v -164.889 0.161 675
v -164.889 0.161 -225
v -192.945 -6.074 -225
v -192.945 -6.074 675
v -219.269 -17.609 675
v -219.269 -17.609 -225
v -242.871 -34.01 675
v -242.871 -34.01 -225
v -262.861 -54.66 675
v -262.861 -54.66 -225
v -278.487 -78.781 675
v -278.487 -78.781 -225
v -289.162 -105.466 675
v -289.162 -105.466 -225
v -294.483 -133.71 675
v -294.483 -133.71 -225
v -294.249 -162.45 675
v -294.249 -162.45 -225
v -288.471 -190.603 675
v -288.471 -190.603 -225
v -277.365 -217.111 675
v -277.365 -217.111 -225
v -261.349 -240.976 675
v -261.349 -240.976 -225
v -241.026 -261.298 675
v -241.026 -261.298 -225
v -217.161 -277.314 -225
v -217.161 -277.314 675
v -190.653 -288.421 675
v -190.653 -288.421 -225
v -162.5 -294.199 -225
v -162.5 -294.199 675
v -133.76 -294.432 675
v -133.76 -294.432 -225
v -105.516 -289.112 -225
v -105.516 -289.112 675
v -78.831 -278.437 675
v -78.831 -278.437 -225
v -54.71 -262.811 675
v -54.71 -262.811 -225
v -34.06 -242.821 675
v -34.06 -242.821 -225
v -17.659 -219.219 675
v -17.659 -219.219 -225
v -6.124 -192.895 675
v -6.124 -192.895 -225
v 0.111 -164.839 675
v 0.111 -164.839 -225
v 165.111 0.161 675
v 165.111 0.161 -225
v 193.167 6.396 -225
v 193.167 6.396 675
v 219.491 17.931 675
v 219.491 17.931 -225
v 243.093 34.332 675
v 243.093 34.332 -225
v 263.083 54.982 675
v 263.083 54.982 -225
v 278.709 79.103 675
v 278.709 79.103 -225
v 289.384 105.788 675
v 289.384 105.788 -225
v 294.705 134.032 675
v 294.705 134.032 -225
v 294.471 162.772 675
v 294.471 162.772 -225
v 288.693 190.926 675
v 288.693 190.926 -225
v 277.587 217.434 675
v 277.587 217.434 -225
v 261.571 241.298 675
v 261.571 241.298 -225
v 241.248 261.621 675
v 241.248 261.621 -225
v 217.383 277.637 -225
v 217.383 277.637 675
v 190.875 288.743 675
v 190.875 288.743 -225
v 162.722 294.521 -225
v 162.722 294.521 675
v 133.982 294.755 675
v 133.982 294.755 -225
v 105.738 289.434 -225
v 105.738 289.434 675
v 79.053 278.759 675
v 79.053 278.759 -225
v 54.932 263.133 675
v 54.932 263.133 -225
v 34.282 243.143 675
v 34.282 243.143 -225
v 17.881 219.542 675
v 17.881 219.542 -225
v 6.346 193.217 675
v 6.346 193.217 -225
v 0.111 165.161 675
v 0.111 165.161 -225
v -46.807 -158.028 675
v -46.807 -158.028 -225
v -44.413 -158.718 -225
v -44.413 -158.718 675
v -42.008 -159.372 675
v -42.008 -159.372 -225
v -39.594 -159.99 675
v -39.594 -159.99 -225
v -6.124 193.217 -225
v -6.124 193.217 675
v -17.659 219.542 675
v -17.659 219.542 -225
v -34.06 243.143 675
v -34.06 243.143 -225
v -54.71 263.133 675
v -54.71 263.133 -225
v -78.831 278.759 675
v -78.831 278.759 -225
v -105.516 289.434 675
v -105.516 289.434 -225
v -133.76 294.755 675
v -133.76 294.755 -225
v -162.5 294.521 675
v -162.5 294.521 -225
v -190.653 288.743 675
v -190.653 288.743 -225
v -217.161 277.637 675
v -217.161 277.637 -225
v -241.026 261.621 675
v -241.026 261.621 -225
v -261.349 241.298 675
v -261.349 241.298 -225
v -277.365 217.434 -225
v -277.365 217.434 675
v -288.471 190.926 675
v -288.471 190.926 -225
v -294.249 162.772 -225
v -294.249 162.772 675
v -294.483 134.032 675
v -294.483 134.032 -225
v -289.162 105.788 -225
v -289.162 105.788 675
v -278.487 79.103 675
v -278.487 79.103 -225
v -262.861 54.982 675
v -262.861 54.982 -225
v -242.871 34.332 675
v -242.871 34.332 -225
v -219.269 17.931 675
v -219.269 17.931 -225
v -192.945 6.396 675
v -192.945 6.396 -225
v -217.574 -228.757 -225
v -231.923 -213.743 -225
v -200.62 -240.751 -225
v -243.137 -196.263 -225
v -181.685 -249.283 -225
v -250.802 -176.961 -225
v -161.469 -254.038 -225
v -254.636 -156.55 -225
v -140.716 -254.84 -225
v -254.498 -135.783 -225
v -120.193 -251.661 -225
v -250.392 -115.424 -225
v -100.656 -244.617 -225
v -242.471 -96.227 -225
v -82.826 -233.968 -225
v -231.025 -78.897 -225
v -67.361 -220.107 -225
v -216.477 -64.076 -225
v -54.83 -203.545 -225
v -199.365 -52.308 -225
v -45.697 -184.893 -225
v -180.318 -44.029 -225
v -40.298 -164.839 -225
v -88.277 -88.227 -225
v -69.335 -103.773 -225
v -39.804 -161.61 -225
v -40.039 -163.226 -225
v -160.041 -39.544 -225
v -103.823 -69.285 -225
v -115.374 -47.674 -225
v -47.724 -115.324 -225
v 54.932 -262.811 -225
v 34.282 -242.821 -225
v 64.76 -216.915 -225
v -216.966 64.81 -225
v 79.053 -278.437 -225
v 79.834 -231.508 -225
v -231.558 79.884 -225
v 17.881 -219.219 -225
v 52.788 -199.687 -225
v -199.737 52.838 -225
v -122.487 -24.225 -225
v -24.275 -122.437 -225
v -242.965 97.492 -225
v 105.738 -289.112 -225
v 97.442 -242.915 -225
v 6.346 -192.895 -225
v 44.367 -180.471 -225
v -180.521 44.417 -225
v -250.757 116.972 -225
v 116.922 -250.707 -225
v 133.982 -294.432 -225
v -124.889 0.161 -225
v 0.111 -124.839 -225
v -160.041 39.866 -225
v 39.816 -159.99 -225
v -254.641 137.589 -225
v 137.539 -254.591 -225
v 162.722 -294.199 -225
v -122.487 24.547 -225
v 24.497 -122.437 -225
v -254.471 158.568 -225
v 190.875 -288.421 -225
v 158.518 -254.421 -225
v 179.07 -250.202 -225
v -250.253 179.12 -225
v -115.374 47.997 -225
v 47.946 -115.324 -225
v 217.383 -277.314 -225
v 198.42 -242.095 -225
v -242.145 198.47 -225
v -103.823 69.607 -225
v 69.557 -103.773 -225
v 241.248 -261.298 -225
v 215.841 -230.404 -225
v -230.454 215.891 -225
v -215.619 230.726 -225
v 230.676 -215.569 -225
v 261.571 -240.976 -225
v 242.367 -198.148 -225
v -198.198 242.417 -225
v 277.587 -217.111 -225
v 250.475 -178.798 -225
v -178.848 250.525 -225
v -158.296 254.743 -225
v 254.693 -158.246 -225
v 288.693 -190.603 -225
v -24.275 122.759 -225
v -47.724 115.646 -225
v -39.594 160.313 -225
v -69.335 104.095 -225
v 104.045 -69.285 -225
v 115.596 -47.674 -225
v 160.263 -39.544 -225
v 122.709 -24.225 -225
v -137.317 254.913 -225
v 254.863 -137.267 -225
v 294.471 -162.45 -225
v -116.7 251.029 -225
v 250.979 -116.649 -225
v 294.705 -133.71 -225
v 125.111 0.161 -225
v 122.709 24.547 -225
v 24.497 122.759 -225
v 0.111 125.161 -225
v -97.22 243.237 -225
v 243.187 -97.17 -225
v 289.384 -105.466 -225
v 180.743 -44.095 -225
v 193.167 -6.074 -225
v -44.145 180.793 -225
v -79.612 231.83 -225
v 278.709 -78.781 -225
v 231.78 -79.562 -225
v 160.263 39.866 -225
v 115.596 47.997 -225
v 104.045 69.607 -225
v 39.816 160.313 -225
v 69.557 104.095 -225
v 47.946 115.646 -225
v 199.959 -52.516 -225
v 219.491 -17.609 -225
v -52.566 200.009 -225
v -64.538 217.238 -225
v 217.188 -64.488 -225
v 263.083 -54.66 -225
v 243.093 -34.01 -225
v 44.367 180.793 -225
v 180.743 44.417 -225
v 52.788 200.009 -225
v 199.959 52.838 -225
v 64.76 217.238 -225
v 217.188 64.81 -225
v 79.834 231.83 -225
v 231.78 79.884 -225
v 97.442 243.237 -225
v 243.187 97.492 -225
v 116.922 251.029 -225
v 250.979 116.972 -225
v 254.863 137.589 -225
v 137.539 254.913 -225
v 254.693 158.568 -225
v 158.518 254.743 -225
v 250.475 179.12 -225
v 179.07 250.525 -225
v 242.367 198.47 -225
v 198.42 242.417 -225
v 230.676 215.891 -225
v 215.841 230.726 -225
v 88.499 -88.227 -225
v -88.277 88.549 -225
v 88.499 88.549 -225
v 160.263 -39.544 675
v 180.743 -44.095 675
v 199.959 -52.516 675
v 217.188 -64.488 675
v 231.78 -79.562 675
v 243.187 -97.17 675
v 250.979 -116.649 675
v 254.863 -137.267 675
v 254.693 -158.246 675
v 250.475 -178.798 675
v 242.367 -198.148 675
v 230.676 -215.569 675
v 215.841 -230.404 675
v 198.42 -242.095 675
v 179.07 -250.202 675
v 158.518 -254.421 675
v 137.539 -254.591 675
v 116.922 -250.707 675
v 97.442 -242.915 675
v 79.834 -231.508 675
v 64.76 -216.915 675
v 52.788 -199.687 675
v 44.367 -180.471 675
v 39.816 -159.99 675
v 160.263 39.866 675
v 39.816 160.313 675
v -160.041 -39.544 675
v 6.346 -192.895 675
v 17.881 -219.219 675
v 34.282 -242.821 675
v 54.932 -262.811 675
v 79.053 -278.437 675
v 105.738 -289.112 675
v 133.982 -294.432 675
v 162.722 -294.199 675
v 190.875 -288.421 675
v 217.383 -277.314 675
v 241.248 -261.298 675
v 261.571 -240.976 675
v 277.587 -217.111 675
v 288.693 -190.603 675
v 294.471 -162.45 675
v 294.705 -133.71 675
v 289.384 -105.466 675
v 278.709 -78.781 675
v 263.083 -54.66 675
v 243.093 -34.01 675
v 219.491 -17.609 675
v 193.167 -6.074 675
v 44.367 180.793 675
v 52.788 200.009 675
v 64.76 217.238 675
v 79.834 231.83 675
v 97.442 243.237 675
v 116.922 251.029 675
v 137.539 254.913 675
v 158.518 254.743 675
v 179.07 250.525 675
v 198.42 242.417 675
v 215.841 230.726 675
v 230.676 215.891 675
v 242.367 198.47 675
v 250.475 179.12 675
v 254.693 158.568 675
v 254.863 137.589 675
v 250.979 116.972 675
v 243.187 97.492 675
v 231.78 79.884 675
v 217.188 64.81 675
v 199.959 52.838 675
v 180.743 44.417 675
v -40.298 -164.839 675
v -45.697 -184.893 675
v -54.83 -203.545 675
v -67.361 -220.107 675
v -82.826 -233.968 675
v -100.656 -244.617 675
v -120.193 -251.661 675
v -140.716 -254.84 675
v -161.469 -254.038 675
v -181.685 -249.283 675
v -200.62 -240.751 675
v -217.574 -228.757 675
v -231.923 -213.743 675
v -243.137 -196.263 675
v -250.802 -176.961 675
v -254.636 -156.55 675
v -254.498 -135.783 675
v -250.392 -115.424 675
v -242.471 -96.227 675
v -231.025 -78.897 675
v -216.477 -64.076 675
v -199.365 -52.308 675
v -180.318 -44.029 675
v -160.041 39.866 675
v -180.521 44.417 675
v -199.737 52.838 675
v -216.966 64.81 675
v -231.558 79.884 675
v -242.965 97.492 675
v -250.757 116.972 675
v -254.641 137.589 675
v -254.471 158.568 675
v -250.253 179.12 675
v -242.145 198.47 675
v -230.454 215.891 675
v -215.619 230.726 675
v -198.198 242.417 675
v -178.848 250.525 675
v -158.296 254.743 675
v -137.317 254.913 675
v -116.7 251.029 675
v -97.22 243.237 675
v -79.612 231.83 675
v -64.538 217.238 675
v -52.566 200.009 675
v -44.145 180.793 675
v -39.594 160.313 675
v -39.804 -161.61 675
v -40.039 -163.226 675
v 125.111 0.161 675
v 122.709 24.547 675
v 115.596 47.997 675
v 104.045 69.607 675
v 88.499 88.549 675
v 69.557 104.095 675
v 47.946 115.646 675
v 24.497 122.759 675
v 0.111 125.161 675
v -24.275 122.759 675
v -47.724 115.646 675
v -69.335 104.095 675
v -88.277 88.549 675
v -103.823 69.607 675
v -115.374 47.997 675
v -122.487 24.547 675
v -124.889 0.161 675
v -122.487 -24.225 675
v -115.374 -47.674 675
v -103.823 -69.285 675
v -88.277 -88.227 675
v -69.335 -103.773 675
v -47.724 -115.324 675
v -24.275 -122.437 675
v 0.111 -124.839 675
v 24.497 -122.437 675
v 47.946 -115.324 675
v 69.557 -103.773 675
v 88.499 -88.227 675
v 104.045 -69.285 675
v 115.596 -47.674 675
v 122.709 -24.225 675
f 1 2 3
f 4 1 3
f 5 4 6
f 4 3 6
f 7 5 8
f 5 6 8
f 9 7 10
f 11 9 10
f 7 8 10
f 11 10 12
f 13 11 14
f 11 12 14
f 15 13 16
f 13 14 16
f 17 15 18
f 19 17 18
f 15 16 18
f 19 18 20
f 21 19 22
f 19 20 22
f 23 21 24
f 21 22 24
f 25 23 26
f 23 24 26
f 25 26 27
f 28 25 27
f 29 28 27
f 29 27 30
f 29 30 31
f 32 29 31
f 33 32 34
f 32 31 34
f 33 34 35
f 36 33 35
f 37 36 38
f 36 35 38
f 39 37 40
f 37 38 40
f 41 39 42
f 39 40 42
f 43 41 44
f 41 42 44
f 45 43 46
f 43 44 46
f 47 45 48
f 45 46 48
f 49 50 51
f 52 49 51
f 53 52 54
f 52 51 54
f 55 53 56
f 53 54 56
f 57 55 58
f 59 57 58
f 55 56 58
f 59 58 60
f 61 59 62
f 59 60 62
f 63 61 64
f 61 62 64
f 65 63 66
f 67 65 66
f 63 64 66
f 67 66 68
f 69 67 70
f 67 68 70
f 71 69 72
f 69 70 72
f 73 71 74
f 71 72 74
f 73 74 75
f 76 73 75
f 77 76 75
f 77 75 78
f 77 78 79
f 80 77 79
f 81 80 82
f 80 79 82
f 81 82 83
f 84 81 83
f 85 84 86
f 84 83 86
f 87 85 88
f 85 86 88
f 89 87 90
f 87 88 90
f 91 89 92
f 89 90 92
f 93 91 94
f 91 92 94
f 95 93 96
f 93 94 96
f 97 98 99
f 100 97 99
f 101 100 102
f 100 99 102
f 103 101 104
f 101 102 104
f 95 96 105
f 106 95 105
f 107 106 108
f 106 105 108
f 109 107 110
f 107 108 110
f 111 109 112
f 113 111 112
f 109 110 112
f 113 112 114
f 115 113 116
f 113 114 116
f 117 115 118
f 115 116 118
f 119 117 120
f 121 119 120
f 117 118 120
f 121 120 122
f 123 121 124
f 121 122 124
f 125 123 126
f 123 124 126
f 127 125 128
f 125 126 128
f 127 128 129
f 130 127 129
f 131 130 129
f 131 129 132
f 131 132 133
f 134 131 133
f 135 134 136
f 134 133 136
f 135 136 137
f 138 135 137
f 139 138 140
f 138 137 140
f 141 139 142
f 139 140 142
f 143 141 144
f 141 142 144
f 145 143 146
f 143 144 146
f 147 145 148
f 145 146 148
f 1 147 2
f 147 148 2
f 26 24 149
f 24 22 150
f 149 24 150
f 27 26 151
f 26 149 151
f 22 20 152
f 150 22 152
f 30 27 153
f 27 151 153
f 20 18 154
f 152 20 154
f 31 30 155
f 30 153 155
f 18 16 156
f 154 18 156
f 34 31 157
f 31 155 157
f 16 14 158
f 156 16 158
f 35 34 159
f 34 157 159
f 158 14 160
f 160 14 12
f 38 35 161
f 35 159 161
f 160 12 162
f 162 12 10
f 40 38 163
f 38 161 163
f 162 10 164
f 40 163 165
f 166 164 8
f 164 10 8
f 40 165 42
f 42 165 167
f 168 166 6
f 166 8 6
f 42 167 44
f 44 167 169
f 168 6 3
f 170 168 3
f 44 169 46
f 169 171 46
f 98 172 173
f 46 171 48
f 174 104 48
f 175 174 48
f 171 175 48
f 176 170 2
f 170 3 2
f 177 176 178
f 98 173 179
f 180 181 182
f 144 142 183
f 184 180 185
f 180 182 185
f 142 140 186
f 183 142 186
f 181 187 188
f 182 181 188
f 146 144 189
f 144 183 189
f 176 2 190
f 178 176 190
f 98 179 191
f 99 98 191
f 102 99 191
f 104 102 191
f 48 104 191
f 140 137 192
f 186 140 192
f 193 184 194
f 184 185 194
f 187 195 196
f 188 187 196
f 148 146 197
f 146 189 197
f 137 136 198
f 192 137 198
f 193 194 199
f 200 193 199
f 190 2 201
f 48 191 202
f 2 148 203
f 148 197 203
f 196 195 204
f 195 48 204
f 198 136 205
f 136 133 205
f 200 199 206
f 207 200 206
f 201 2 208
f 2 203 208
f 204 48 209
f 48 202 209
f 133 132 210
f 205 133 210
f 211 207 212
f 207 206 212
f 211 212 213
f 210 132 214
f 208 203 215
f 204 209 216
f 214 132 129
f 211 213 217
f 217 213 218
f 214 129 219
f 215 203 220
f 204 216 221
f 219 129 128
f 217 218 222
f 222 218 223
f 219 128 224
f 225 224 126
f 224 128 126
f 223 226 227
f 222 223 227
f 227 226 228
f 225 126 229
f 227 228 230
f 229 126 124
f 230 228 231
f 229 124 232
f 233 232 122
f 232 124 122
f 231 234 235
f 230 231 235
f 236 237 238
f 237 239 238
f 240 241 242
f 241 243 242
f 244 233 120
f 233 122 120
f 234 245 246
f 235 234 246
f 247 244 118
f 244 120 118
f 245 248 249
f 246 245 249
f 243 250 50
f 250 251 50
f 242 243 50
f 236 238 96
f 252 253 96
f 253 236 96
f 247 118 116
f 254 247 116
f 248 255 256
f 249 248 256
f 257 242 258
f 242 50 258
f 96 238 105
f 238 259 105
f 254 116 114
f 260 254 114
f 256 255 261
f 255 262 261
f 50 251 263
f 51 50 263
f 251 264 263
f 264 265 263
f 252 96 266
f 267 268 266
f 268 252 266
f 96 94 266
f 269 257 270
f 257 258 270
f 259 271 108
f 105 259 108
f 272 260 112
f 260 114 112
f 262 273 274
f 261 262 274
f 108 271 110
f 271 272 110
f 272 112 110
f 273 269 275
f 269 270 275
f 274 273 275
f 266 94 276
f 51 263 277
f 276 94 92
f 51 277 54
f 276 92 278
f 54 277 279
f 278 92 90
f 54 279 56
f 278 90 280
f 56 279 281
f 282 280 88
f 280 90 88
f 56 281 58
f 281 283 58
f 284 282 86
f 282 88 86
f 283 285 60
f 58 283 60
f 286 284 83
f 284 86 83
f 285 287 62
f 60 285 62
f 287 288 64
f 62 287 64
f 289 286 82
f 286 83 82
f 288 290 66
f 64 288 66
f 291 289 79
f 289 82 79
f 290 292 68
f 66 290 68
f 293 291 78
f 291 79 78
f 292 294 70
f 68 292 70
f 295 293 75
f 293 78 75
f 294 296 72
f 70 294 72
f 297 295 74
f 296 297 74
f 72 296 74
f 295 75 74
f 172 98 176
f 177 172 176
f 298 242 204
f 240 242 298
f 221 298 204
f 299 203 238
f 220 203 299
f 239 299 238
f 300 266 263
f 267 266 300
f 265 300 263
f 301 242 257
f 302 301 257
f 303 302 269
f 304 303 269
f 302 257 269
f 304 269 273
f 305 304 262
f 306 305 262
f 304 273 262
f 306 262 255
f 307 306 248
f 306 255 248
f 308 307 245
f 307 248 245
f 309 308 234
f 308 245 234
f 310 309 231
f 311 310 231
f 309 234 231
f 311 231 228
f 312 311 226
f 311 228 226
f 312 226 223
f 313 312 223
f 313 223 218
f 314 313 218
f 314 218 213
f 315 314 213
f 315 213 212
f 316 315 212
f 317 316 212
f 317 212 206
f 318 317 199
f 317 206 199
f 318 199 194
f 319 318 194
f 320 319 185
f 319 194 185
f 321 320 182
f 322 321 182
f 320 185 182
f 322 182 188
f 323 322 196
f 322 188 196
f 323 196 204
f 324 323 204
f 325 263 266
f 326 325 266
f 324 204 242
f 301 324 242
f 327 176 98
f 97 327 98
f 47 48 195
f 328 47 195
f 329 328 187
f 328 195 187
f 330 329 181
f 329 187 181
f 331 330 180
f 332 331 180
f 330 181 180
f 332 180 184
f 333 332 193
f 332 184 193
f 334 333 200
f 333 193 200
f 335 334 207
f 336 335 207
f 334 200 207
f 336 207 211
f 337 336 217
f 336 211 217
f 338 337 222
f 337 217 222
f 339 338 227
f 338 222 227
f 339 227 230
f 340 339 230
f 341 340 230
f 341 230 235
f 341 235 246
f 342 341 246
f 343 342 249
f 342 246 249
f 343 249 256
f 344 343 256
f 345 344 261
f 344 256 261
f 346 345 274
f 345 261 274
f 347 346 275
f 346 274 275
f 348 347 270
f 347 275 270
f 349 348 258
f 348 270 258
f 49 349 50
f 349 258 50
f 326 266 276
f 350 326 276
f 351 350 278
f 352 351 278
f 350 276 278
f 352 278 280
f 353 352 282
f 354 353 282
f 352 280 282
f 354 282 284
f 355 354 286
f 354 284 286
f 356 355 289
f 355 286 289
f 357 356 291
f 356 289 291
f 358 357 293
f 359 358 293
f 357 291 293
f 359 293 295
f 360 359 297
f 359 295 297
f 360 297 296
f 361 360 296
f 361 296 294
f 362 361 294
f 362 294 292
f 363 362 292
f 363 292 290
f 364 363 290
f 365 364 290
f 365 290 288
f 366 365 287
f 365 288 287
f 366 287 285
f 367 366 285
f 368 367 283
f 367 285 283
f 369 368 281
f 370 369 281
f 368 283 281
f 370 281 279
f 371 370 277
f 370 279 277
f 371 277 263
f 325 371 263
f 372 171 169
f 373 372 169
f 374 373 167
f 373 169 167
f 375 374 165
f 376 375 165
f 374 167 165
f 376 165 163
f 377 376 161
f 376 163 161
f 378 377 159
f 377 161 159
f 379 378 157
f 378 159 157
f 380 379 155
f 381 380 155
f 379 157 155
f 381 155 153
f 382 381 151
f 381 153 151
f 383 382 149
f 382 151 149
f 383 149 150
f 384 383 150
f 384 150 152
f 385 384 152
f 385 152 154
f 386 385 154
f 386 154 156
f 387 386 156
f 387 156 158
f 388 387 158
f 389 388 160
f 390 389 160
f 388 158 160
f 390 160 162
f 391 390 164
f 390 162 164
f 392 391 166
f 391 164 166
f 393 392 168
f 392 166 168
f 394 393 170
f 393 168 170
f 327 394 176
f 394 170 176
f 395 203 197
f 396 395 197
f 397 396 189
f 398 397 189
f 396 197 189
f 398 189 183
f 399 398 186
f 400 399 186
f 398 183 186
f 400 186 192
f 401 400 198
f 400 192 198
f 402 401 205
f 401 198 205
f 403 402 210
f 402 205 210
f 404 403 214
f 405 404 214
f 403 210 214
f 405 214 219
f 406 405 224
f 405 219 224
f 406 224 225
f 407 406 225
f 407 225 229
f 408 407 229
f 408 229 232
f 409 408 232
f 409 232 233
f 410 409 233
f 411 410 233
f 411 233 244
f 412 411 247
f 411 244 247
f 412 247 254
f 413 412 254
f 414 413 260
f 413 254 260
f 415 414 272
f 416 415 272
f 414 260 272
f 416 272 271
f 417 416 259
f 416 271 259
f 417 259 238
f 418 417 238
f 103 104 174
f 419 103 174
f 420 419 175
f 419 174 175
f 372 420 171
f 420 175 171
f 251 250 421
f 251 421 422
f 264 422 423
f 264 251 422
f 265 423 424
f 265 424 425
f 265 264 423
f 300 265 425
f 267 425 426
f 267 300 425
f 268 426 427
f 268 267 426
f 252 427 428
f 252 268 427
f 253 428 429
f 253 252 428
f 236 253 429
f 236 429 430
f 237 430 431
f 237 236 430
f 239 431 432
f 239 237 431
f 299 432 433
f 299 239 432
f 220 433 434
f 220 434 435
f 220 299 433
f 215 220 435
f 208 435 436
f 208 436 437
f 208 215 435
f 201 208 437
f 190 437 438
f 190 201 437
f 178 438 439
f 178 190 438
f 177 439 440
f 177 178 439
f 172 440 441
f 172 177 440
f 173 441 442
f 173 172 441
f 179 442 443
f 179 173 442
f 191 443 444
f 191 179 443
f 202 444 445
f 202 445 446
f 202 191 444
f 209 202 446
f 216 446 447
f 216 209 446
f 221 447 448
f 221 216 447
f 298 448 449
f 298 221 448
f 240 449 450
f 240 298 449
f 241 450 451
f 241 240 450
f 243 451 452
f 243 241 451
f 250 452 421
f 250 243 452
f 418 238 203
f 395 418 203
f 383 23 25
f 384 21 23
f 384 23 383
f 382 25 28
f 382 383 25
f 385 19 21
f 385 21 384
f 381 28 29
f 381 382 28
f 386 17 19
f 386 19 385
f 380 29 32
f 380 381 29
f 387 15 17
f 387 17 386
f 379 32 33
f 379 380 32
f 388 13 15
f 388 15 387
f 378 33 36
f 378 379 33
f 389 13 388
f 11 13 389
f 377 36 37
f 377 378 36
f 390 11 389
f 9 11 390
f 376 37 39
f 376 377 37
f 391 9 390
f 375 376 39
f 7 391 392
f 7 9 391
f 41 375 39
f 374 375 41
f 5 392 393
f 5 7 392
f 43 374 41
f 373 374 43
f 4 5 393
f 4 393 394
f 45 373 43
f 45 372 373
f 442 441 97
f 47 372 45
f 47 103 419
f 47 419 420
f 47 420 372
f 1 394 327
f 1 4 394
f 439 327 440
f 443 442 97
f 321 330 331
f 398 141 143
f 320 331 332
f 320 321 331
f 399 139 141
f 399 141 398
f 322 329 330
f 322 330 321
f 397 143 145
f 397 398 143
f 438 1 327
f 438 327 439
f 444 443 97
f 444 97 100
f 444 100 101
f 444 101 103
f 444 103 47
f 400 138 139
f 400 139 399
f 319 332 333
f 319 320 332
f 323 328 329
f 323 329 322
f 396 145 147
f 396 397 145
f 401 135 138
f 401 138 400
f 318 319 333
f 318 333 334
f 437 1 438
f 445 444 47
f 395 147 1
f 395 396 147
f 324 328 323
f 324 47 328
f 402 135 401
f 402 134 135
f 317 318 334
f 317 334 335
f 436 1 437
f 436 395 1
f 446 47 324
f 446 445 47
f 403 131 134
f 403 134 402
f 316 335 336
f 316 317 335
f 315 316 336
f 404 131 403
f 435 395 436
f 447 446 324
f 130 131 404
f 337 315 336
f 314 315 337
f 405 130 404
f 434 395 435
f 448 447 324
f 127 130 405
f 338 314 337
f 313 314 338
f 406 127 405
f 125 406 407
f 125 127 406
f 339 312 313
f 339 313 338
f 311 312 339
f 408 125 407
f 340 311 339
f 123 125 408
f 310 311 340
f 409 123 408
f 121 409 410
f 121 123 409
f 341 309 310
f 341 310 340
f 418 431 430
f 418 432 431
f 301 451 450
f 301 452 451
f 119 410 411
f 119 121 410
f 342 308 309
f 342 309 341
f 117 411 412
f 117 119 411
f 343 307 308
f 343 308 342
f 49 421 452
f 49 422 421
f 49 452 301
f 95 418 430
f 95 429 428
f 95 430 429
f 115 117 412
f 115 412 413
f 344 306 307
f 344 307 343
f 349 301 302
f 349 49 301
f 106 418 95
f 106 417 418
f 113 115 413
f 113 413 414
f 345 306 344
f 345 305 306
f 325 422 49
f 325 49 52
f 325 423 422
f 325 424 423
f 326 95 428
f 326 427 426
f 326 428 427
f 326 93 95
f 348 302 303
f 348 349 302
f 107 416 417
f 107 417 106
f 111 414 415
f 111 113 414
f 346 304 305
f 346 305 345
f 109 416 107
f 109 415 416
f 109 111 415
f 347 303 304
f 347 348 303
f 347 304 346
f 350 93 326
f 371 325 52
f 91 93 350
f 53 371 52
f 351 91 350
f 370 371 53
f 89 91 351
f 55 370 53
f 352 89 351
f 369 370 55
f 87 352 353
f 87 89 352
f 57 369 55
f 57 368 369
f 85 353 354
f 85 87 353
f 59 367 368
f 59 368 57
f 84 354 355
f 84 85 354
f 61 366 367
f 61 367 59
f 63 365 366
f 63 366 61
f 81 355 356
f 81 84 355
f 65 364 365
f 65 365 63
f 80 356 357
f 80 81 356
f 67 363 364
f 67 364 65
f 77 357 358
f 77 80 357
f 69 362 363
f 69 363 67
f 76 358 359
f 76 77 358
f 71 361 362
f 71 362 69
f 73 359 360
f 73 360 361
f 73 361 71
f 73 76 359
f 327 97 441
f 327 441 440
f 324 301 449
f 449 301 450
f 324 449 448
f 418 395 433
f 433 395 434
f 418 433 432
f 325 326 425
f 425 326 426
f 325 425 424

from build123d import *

# Parameters (mm, degrees)
SKETCH1_R           = 62.5
BOSS_EXTRUDE1_DEPTH = 450
SCALE1_SCALE        = 2


with BuildPart() as part:
    # Sketch1 → Boss-Extrude1 (new body)
    with BuildSketch(Plane.XY):
        with BuildLine():
            ThreePointArc((0, 82.5), (-125.896146437, 125.896146437), (-82.5, 0))
            ThreePointArc((-82.5, 0), (-125.896146437, -125.896146437), (0, -82.5))
            ThreePointArc((0, -82.5), (125.896146437, -125.896146437), (82.5, 0))
            ThreePointArc((82.5, 0), (125.896146437, 125.896146437), (0, 82.5))
        make_face()
        with BuildLine():
            ThreePointArc((-20.204468067, -82.5), (-112.61028354, -110.878115832), (-80.075757576, -19.85253255))
            Line((-80.075757576, -19.85253255), (-23.459201006, -79.094348016))
            ThreePointArc((-23.459201006, -79.094348016), (-21.661425556, -79.605481237), (-19.85253255, -80.075757576))
            ThreePointArc((-19.85253255, -80.075757576), (-20.014769218, -81.289872177), (-20.204468067, -82.5))
        make_face(mode=Mode.SUBTRACT)
        with BuildLine():
            ThreePointArc((80.075757576, -19.85253255), (111.754010814, -111.754010814), (19.85253255, -80.075757576))
            Line((19.85253255, -80.075757576), (80.075757576, -19.85253255))
        make_face(mode=Mode.SUBTRACT)
        Circle(SKETCH1_R, mode=Mode.SUBTRACT)
        with BuildLine():
            ThreePointArc((-80.075757576, 19.85253255), (-111.754010814, 111.754010814), (-19.85253255, 80.075757576))
            Line((-19.85253255, 80.075757576), (-80.075757576, 19.85253255))
        make_face(mode=Mode.SUBTRACT)
        with BuildLine():
            ThreePointArc((19.85253255, 80.075757576), (111.754010814, 111.754010814), (80.075757576, 19.85253255))
            Line((80.075757576, 19.85253255), (19.85253255, 80.075757576))
        make_face(mode=Mode.SUBTRACT)
    extrude(amount=BOSS_EXTRUDE1_DEPTH)


with BuildPart() as part_1:
    # Scale1: scaled about (-0.110996519, -0.161131332, 225)
    add(part.part.scale(SCALE1_SCALE).moved(Location((0.110996519, 0.161131332, -225))))


solid = part_1.part
